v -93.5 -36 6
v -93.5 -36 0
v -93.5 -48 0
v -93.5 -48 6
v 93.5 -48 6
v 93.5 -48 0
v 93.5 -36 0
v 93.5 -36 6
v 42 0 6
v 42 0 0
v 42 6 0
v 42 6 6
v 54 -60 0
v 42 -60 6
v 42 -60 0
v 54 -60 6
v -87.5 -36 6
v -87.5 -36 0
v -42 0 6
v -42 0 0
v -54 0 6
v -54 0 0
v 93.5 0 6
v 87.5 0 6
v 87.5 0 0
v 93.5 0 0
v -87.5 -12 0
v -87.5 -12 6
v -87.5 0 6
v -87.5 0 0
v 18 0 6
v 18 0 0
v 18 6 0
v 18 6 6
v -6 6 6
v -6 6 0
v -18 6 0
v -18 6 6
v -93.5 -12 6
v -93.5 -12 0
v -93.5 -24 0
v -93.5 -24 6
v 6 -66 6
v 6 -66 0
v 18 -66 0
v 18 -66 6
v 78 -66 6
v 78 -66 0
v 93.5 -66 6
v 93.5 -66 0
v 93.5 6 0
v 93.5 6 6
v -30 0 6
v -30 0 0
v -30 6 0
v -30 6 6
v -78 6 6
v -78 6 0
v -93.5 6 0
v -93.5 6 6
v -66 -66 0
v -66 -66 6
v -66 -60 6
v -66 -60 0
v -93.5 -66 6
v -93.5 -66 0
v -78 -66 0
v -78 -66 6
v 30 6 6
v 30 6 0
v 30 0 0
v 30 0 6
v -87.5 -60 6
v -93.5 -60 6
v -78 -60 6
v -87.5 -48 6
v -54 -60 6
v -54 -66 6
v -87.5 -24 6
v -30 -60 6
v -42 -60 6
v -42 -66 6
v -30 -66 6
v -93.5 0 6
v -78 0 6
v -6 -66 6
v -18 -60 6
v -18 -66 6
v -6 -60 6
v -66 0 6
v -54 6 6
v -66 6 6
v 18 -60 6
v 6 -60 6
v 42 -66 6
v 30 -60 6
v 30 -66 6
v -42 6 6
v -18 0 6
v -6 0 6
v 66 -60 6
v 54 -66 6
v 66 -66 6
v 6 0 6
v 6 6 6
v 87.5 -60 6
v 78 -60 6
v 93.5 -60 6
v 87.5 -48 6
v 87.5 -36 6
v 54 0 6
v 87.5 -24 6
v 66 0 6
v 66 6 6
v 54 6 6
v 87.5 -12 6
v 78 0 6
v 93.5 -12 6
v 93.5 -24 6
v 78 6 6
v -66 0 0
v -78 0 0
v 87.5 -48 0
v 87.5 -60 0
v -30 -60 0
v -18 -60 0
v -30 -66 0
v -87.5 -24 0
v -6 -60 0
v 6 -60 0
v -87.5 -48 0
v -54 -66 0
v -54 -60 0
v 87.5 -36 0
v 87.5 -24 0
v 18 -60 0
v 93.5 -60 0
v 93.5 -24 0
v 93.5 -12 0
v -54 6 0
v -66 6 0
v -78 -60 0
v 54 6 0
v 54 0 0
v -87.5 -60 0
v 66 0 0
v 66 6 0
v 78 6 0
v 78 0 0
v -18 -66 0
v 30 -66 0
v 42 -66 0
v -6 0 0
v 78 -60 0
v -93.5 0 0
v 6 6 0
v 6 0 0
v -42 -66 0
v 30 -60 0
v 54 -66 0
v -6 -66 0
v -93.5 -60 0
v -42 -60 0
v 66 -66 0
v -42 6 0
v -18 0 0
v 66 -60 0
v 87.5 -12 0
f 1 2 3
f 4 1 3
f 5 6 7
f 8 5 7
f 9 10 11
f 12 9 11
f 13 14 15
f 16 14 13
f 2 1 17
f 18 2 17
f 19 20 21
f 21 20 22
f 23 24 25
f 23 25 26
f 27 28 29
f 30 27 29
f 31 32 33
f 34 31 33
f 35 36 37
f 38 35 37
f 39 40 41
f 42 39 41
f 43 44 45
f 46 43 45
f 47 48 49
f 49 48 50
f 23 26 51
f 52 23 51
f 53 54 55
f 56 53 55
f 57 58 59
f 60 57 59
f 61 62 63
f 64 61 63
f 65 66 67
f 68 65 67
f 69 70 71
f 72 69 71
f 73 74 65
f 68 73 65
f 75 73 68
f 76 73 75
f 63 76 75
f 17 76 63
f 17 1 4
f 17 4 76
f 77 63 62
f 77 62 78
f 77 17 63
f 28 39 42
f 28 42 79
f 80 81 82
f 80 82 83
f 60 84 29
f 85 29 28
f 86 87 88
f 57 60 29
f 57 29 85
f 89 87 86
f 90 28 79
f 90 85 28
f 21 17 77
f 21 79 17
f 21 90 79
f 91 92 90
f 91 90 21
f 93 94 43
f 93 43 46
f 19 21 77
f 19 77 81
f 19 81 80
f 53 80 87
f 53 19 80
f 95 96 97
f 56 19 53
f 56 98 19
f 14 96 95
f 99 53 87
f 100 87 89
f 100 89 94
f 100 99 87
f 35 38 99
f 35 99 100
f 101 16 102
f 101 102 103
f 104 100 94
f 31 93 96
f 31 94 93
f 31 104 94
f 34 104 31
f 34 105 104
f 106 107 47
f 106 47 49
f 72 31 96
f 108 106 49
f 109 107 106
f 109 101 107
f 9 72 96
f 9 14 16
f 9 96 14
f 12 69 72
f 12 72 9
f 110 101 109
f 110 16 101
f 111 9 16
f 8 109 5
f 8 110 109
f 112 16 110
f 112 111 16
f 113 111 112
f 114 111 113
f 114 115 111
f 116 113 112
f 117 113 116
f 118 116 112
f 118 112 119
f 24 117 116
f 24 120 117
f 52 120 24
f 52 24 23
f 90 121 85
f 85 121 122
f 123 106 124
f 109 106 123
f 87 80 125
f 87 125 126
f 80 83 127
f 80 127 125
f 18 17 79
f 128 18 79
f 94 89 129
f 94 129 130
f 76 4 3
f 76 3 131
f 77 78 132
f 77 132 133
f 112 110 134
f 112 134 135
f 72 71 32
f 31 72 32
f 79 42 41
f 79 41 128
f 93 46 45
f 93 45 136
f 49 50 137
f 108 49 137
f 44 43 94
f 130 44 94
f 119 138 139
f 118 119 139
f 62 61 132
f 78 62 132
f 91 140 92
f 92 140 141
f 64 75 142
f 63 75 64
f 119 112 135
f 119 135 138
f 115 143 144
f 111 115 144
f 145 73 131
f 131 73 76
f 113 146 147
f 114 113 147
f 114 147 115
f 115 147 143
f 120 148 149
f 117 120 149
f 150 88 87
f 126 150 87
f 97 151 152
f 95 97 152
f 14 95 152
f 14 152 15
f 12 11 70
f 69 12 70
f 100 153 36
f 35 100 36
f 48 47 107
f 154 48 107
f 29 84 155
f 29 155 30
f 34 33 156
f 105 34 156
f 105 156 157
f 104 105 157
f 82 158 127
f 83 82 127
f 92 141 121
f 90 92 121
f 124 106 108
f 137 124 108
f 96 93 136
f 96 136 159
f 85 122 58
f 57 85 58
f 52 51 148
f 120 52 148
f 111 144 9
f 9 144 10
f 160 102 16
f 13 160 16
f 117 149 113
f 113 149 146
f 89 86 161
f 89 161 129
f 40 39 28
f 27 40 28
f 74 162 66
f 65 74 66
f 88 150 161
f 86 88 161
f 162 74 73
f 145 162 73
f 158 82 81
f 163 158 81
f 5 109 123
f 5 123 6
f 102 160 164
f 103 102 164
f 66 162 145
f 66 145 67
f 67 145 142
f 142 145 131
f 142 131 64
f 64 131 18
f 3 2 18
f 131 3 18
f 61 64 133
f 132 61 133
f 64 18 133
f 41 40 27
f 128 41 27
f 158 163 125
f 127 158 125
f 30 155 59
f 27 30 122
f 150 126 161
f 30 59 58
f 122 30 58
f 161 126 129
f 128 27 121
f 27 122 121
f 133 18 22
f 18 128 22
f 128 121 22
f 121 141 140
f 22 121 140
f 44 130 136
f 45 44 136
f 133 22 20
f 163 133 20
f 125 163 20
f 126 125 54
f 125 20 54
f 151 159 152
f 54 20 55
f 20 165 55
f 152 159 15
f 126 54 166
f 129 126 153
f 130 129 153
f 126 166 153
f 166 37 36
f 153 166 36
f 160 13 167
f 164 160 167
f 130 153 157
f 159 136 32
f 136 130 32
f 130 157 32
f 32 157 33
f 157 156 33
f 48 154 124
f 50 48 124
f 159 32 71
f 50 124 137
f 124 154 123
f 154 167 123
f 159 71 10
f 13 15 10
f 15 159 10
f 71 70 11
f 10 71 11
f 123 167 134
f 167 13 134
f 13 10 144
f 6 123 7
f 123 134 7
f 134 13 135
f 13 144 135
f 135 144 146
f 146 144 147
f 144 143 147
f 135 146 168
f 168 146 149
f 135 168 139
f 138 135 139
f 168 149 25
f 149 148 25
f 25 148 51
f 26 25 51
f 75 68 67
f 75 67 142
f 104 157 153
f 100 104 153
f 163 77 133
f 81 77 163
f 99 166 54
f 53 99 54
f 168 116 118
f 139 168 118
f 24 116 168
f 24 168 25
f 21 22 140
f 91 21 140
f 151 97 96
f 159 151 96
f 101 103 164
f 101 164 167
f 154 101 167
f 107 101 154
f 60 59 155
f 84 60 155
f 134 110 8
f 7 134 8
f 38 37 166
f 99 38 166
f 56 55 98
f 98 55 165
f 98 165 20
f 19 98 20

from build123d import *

# Parameters (mm, degrees)
SKETCH1_W           = 6
SKETCH1_H           = 12
BOSS_EXTRUDE3_DEPTH = 6
SKETCH3_W           = 6
SKETCH3_H           = 12
CUT_EXTRUDE1_DEPTH  = 6
SKETCH4_W           = 12
SKETCH4_H           = 6
CUT_EXTRUDE2_DEPTH  = 6


with BuildPart() as part:
    # Sketch1 → Boss-Extrude3 (new body)
    with BuildSketch(Plane.XY):
        Polygon((-93.5, 6), (-93.5, -66), (93.5, -66), (93.5, 6), (78, 6), (78, 0), (66, 0), (66, 6), (54, 6), (54, 0), (42, 0), (42, 6), (30, 6), (30, 0), (18, 0), (18, 6), (6, 6), (6, 0), (-6, 0), (-6, 6), (-18, 6), (-18, 0), (-30, 0), (-30, 6), (-42, 6), (-42, 0), (-54, 0), (-54, 6), (-66, 6), (-66, 0), (-78, 0), (-78, 6), align=None)
        with Locations((90.5, -6)):
            Rectangle(SKETCH1_W, SKETCH1_H)
        with Locations((90.5, -30)):
            Rectangle(SKETCH1_W, SKETCH1_H)
        with Locations((90.5, -54)):
            Rectangle(SKETCH1_W, SKETCH1_H)
    extrude(amount=BOSS_EXTRUDE3_DEPTH)

    # Sketch3 → Cut-Extrude1 (cut)
    with BuildSketch(Plane.XY.offset(6)):
        with Locations((-90.5, -6)):
            Rectangle(SKETCH3_W, SKETCH3_H)
        with Locations((90.5, -6)):
            Rectangle(SKETCH3_W, SKETCH3_H)
        with Locations((90.5, -30)):
            Rectangle(SKETCH3_W, SKETCH3_H)
        with Locations((90.5, -54)):
            Rectangle(SKETCH3_W, SKETCH3_H)
        with Locations((-90.5, -30)):
            Rectangle(SKETCH3_W, SKETCH3_H)
        with Locations((-90.5, -54)):
            Rectangle(SKETCH3_W, SKETCH3_H)
    extrude(amount=-CUT_EXTRUDE1_DEPTH, mode=Mode.SUBTRACT)

    # Sketch4 → Cut-Extrude2 (cut)
    with BuildSketch(Plane.XY.offset(6)):
        with Locations((-72, -63)):
            Rectangle(SKETCH4_W, SKETCH4_H)
        with Locations((-48, -63)):
            Rectangle(SKETCH4_W, SKETCH4_H)
        with Locations((-24, -63)):
            Rectangle(SKETCH4_W, SKETCH4_H)
        with Locations((0, -63)):
            Rectangle(SKETCH4_W, SKETCH4_H)
        with Locations((24, -63)):
            Rectangle(SKETCH4_W, SKETCH4_H)
        with Locations((48, -63)):
            Rectangle(SKETCH4_W, SKETCH4_H)
        with Locations((72, -63)):
            Rectangle(SKETCH4_W, SKETCH4_H)
    extrude(amount=-CUT_EXTRUDE2_DEPTH, mode=Mode.SUBTRACT)


solid = part.part
